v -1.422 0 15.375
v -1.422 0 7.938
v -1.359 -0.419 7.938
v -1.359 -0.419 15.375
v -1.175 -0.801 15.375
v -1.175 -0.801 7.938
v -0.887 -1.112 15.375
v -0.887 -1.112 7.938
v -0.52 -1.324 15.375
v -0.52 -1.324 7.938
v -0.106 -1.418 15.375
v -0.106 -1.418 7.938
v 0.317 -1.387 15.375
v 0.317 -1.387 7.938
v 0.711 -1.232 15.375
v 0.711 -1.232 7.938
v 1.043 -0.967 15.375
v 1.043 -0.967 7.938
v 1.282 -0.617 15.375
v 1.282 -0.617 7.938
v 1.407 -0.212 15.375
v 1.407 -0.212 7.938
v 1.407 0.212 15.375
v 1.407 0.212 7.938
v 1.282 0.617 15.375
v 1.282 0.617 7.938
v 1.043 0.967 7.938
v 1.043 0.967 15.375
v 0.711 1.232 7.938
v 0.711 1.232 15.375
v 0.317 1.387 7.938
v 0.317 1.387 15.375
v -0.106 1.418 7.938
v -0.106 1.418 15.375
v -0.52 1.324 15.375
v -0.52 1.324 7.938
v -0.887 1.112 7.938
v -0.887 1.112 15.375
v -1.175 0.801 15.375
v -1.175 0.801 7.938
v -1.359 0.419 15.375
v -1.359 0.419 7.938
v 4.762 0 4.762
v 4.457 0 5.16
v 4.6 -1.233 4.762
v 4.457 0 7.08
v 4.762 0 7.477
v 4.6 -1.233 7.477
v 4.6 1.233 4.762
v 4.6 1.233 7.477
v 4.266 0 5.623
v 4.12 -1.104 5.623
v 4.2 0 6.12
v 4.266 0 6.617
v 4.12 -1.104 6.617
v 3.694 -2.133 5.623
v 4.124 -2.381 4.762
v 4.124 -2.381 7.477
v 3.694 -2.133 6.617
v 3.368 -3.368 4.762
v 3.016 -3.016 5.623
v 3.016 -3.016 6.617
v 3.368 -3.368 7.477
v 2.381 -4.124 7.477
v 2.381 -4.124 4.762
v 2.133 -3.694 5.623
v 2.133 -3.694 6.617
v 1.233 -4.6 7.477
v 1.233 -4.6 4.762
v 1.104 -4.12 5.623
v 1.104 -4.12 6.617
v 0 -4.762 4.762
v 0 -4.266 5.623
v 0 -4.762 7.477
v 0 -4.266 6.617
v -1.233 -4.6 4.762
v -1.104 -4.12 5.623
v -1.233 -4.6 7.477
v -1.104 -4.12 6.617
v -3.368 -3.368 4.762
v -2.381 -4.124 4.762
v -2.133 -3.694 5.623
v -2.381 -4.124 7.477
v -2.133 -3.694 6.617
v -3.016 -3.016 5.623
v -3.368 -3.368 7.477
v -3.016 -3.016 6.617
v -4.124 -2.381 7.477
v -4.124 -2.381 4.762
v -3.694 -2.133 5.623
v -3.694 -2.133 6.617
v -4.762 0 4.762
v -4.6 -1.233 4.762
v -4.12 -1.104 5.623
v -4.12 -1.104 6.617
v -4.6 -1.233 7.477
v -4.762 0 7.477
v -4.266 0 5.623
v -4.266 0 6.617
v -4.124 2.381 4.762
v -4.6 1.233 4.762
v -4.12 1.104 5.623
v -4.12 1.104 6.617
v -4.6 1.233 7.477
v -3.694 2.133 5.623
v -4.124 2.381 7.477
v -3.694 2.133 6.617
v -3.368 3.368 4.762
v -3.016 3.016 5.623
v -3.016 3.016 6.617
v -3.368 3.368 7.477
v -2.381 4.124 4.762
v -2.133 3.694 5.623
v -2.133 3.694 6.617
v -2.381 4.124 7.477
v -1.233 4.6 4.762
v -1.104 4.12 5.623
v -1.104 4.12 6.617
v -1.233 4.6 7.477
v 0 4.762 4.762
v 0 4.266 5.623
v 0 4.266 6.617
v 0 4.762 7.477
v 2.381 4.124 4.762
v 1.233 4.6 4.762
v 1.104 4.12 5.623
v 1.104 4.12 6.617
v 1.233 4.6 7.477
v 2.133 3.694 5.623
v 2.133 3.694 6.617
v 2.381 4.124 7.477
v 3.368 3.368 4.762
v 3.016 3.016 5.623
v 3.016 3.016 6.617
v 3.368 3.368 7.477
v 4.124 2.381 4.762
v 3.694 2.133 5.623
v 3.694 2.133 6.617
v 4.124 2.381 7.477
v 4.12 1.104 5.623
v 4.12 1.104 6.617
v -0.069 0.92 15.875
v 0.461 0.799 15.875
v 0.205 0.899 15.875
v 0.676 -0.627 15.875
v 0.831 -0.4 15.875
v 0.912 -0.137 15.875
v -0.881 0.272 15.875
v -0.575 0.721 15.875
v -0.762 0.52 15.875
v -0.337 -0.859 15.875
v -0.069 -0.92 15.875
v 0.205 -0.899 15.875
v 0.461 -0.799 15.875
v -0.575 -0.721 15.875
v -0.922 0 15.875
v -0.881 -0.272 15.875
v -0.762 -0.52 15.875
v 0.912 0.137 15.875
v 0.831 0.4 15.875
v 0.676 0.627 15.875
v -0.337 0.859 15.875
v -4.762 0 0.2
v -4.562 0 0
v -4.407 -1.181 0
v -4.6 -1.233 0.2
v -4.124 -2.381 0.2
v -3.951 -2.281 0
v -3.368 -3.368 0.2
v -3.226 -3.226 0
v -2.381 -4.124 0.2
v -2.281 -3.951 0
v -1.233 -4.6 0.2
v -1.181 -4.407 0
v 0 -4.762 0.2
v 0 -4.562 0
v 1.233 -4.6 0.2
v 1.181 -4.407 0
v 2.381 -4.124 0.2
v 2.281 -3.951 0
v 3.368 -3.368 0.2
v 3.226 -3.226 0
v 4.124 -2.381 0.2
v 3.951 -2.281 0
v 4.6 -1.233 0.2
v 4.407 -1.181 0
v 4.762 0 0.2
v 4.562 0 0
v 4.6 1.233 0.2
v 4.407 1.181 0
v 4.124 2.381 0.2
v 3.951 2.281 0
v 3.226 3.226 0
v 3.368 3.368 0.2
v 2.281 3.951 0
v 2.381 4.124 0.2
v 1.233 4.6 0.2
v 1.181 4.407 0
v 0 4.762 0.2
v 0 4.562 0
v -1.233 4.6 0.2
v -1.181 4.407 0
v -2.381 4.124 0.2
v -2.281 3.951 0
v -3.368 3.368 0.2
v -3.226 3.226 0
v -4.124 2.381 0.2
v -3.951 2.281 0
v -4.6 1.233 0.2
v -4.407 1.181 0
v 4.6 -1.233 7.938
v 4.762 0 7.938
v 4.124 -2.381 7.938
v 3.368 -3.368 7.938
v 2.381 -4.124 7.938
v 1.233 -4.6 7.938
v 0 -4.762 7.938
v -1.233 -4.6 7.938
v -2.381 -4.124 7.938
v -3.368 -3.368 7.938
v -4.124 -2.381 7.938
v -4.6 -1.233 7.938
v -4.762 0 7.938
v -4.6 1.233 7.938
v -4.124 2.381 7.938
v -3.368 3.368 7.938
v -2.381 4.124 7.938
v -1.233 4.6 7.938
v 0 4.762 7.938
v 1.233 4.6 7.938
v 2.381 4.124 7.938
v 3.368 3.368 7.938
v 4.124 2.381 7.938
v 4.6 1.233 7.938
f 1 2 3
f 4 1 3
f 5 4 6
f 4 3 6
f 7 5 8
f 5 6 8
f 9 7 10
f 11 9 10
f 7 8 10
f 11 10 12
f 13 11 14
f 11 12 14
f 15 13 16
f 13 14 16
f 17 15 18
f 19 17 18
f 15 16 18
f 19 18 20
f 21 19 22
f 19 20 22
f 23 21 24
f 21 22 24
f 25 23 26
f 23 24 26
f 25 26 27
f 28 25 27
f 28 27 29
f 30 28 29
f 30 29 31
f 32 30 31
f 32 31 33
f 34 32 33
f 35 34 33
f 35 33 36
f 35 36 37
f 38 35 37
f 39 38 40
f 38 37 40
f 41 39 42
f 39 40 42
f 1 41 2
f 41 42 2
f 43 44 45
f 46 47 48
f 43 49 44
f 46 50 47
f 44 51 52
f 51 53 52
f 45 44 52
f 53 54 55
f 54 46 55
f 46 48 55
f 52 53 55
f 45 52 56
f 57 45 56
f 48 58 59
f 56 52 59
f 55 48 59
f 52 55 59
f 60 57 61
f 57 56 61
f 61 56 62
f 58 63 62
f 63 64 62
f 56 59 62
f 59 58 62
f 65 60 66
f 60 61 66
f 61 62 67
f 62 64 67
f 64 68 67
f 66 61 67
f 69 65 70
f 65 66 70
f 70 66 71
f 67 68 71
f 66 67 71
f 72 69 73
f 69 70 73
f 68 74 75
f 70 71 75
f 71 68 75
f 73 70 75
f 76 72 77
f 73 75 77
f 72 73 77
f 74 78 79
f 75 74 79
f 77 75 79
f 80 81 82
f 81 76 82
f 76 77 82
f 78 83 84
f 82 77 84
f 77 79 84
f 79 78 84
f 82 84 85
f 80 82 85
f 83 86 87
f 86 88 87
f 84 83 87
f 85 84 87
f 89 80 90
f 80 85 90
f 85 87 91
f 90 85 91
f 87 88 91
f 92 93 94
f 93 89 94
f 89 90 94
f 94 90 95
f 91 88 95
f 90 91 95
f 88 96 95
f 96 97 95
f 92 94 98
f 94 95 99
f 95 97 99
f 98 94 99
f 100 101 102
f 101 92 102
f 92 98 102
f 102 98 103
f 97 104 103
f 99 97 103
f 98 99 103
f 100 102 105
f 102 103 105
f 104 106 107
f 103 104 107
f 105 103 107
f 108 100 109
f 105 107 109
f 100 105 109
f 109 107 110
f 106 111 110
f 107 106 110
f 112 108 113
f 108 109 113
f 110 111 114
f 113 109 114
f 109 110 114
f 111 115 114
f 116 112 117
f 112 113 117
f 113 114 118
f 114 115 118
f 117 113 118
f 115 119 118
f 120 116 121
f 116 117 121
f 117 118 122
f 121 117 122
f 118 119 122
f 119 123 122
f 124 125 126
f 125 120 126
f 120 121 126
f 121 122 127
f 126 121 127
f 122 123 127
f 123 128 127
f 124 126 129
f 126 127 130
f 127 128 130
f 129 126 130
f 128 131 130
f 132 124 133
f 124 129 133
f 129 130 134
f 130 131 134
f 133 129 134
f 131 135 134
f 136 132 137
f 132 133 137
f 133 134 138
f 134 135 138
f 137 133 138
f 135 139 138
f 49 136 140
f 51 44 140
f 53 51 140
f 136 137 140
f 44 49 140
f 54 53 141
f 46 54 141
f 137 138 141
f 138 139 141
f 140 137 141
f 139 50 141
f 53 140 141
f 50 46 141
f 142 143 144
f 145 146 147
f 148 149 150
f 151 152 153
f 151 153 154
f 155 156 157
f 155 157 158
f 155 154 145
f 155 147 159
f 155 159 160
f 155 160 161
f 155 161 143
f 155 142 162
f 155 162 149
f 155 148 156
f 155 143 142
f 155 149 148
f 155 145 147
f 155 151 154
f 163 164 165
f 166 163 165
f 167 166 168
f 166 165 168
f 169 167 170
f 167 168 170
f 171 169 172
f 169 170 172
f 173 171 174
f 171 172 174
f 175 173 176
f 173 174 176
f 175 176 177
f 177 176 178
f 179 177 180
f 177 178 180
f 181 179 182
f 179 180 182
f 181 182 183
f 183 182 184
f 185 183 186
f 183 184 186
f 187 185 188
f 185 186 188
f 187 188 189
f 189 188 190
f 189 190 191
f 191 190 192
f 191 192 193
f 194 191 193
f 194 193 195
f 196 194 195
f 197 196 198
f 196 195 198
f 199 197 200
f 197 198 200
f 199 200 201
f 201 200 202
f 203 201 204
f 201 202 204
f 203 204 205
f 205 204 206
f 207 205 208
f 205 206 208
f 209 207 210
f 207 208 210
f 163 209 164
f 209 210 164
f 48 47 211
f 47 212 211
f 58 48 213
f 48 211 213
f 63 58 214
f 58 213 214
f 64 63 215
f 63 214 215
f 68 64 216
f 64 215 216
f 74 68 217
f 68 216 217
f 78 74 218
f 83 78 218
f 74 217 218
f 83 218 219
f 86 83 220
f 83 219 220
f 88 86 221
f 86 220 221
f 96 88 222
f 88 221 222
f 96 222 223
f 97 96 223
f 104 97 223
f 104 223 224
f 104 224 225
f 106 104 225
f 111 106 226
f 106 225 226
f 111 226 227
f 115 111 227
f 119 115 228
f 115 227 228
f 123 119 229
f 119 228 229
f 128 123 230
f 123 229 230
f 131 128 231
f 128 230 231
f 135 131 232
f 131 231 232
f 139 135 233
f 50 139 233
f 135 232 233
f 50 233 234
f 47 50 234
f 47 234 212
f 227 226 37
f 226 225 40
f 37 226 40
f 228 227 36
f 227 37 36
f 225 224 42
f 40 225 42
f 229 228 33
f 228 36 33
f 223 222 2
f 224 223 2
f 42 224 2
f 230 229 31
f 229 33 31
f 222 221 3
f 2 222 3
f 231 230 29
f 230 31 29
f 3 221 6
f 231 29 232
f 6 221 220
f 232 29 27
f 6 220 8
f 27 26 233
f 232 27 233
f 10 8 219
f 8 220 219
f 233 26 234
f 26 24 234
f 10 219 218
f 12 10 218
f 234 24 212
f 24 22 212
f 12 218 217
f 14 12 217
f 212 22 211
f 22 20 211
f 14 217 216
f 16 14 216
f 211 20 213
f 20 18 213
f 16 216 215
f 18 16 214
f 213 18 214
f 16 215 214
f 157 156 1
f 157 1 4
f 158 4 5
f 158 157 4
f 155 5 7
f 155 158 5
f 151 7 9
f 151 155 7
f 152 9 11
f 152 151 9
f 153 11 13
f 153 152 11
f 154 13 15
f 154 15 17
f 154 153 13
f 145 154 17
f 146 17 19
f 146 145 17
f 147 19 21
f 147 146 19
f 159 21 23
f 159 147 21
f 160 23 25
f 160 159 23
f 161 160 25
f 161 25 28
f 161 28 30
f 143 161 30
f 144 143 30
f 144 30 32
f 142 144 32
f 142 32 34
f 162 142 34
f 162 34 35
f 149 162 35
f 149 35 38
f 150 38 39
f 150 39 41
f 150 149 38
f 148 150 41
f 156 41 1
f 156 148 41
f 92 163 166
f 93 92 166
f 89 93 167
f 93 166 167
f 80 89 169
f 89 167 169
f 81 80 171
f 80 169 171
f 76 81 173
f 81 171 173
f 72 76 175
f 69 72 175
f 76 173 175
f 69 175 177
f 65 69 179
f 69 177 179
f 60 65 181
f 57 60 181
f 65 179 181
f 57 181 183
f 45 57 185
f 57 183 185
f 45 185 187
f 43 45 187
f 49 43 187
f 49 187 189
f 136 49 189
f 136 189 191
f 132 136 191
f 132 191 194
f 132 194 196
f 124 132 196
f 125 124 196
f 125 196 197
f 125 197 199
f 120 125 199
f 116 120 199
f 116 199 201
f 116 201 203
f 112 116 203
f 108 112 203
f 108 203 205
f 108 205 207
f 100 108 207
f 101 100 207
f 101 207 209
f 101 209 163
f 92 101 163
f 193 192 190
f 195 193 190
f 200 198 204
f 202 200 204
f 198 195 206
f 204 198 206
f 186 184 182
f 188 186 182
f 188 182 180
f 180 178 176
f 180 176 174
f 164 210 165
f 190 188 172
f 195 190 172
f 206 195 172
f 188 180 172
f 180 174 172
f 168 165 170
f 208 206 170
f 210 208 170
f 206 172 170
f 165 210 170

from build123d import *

# Parameters (mm, degrees)
SKETCH1_R           = 4.7625
BOSS_EXTRUDE1_DEPTH = 4.7625
SKETCH3_R           = 1.4224
BOSS_EXTRUDE2_DEPTH = 7.9375
CHAMFER1_SIZE       = 0.2
CHAMFER2_SIZE       = 0.5


with BuildPart() as part:
    # Sketch1 → Boss-Extrude1 (new body)
    with BuildSketch(Plane.XY):
        with Locations(Location((0, 0, 0), (0, 0, 180))):
            Circle(SKETCH1_R)
    extrude(amount=BOSS_EXTRUDE1_DEPTH)

    # Sketch2 → Revolve1 (revolve)
    with BuildSketch(Plane(origin=(0, 0, 0), x_dir=(1, 0, 0), z_dir=(0, 1, 0)), mode=Mode.PRIVATE) as revolve1_sk:
        with BuildLine():
            Line((-4.7625, -7.477150663), (-4.7625, -7.9375))
            Line((-4.7625, -7.9375), (0, -7.9375))
            Line((0, -7.9375), (0, -4.7625))
            Line((0, -4.7625), (-4.7625, -4.7625))
            ThreePointArc((-4.7625, -4.7625), (-4.200277439, -6.119825331), (-4.7625, -7.477150663))
        make_face()
    revolve(revolve1_sk.sketch.rotate(Axis((0, 0, 7.9375), (0, 0, -1)), 180), axis=Axis((0, 0, 7.9375), (0, 0, -1)))

    # Sketch3 → Boss-Extrude2 (add)
    with BuildSketch(Plane.XY.offset(7.9375)):
        with Locations(Location((0, 0, 0), (0, 0, 180))):
            Circle(SKETCH3_R)
    extrude(amount=BOSS_EXTRUDE2_DEPTH)

    # Chamfer1
    chamfer1_edges = [part.edges().sort_by_distance(p)[0] for p in [
        (4.7625, 0, 0),
    ]]
    chamfer(chamfer1_edges, length=CHAMFER1_SIZE)

    # Chamfer2
    chamfer2_edges = [part.edges().sort_by_distance(p)[0] for p in [
        (1.4224, 0, 15.875),
    ]]
    chamfer(chamfer2_edges, length=CHAMFER2_SIZE)


solid = part.part
